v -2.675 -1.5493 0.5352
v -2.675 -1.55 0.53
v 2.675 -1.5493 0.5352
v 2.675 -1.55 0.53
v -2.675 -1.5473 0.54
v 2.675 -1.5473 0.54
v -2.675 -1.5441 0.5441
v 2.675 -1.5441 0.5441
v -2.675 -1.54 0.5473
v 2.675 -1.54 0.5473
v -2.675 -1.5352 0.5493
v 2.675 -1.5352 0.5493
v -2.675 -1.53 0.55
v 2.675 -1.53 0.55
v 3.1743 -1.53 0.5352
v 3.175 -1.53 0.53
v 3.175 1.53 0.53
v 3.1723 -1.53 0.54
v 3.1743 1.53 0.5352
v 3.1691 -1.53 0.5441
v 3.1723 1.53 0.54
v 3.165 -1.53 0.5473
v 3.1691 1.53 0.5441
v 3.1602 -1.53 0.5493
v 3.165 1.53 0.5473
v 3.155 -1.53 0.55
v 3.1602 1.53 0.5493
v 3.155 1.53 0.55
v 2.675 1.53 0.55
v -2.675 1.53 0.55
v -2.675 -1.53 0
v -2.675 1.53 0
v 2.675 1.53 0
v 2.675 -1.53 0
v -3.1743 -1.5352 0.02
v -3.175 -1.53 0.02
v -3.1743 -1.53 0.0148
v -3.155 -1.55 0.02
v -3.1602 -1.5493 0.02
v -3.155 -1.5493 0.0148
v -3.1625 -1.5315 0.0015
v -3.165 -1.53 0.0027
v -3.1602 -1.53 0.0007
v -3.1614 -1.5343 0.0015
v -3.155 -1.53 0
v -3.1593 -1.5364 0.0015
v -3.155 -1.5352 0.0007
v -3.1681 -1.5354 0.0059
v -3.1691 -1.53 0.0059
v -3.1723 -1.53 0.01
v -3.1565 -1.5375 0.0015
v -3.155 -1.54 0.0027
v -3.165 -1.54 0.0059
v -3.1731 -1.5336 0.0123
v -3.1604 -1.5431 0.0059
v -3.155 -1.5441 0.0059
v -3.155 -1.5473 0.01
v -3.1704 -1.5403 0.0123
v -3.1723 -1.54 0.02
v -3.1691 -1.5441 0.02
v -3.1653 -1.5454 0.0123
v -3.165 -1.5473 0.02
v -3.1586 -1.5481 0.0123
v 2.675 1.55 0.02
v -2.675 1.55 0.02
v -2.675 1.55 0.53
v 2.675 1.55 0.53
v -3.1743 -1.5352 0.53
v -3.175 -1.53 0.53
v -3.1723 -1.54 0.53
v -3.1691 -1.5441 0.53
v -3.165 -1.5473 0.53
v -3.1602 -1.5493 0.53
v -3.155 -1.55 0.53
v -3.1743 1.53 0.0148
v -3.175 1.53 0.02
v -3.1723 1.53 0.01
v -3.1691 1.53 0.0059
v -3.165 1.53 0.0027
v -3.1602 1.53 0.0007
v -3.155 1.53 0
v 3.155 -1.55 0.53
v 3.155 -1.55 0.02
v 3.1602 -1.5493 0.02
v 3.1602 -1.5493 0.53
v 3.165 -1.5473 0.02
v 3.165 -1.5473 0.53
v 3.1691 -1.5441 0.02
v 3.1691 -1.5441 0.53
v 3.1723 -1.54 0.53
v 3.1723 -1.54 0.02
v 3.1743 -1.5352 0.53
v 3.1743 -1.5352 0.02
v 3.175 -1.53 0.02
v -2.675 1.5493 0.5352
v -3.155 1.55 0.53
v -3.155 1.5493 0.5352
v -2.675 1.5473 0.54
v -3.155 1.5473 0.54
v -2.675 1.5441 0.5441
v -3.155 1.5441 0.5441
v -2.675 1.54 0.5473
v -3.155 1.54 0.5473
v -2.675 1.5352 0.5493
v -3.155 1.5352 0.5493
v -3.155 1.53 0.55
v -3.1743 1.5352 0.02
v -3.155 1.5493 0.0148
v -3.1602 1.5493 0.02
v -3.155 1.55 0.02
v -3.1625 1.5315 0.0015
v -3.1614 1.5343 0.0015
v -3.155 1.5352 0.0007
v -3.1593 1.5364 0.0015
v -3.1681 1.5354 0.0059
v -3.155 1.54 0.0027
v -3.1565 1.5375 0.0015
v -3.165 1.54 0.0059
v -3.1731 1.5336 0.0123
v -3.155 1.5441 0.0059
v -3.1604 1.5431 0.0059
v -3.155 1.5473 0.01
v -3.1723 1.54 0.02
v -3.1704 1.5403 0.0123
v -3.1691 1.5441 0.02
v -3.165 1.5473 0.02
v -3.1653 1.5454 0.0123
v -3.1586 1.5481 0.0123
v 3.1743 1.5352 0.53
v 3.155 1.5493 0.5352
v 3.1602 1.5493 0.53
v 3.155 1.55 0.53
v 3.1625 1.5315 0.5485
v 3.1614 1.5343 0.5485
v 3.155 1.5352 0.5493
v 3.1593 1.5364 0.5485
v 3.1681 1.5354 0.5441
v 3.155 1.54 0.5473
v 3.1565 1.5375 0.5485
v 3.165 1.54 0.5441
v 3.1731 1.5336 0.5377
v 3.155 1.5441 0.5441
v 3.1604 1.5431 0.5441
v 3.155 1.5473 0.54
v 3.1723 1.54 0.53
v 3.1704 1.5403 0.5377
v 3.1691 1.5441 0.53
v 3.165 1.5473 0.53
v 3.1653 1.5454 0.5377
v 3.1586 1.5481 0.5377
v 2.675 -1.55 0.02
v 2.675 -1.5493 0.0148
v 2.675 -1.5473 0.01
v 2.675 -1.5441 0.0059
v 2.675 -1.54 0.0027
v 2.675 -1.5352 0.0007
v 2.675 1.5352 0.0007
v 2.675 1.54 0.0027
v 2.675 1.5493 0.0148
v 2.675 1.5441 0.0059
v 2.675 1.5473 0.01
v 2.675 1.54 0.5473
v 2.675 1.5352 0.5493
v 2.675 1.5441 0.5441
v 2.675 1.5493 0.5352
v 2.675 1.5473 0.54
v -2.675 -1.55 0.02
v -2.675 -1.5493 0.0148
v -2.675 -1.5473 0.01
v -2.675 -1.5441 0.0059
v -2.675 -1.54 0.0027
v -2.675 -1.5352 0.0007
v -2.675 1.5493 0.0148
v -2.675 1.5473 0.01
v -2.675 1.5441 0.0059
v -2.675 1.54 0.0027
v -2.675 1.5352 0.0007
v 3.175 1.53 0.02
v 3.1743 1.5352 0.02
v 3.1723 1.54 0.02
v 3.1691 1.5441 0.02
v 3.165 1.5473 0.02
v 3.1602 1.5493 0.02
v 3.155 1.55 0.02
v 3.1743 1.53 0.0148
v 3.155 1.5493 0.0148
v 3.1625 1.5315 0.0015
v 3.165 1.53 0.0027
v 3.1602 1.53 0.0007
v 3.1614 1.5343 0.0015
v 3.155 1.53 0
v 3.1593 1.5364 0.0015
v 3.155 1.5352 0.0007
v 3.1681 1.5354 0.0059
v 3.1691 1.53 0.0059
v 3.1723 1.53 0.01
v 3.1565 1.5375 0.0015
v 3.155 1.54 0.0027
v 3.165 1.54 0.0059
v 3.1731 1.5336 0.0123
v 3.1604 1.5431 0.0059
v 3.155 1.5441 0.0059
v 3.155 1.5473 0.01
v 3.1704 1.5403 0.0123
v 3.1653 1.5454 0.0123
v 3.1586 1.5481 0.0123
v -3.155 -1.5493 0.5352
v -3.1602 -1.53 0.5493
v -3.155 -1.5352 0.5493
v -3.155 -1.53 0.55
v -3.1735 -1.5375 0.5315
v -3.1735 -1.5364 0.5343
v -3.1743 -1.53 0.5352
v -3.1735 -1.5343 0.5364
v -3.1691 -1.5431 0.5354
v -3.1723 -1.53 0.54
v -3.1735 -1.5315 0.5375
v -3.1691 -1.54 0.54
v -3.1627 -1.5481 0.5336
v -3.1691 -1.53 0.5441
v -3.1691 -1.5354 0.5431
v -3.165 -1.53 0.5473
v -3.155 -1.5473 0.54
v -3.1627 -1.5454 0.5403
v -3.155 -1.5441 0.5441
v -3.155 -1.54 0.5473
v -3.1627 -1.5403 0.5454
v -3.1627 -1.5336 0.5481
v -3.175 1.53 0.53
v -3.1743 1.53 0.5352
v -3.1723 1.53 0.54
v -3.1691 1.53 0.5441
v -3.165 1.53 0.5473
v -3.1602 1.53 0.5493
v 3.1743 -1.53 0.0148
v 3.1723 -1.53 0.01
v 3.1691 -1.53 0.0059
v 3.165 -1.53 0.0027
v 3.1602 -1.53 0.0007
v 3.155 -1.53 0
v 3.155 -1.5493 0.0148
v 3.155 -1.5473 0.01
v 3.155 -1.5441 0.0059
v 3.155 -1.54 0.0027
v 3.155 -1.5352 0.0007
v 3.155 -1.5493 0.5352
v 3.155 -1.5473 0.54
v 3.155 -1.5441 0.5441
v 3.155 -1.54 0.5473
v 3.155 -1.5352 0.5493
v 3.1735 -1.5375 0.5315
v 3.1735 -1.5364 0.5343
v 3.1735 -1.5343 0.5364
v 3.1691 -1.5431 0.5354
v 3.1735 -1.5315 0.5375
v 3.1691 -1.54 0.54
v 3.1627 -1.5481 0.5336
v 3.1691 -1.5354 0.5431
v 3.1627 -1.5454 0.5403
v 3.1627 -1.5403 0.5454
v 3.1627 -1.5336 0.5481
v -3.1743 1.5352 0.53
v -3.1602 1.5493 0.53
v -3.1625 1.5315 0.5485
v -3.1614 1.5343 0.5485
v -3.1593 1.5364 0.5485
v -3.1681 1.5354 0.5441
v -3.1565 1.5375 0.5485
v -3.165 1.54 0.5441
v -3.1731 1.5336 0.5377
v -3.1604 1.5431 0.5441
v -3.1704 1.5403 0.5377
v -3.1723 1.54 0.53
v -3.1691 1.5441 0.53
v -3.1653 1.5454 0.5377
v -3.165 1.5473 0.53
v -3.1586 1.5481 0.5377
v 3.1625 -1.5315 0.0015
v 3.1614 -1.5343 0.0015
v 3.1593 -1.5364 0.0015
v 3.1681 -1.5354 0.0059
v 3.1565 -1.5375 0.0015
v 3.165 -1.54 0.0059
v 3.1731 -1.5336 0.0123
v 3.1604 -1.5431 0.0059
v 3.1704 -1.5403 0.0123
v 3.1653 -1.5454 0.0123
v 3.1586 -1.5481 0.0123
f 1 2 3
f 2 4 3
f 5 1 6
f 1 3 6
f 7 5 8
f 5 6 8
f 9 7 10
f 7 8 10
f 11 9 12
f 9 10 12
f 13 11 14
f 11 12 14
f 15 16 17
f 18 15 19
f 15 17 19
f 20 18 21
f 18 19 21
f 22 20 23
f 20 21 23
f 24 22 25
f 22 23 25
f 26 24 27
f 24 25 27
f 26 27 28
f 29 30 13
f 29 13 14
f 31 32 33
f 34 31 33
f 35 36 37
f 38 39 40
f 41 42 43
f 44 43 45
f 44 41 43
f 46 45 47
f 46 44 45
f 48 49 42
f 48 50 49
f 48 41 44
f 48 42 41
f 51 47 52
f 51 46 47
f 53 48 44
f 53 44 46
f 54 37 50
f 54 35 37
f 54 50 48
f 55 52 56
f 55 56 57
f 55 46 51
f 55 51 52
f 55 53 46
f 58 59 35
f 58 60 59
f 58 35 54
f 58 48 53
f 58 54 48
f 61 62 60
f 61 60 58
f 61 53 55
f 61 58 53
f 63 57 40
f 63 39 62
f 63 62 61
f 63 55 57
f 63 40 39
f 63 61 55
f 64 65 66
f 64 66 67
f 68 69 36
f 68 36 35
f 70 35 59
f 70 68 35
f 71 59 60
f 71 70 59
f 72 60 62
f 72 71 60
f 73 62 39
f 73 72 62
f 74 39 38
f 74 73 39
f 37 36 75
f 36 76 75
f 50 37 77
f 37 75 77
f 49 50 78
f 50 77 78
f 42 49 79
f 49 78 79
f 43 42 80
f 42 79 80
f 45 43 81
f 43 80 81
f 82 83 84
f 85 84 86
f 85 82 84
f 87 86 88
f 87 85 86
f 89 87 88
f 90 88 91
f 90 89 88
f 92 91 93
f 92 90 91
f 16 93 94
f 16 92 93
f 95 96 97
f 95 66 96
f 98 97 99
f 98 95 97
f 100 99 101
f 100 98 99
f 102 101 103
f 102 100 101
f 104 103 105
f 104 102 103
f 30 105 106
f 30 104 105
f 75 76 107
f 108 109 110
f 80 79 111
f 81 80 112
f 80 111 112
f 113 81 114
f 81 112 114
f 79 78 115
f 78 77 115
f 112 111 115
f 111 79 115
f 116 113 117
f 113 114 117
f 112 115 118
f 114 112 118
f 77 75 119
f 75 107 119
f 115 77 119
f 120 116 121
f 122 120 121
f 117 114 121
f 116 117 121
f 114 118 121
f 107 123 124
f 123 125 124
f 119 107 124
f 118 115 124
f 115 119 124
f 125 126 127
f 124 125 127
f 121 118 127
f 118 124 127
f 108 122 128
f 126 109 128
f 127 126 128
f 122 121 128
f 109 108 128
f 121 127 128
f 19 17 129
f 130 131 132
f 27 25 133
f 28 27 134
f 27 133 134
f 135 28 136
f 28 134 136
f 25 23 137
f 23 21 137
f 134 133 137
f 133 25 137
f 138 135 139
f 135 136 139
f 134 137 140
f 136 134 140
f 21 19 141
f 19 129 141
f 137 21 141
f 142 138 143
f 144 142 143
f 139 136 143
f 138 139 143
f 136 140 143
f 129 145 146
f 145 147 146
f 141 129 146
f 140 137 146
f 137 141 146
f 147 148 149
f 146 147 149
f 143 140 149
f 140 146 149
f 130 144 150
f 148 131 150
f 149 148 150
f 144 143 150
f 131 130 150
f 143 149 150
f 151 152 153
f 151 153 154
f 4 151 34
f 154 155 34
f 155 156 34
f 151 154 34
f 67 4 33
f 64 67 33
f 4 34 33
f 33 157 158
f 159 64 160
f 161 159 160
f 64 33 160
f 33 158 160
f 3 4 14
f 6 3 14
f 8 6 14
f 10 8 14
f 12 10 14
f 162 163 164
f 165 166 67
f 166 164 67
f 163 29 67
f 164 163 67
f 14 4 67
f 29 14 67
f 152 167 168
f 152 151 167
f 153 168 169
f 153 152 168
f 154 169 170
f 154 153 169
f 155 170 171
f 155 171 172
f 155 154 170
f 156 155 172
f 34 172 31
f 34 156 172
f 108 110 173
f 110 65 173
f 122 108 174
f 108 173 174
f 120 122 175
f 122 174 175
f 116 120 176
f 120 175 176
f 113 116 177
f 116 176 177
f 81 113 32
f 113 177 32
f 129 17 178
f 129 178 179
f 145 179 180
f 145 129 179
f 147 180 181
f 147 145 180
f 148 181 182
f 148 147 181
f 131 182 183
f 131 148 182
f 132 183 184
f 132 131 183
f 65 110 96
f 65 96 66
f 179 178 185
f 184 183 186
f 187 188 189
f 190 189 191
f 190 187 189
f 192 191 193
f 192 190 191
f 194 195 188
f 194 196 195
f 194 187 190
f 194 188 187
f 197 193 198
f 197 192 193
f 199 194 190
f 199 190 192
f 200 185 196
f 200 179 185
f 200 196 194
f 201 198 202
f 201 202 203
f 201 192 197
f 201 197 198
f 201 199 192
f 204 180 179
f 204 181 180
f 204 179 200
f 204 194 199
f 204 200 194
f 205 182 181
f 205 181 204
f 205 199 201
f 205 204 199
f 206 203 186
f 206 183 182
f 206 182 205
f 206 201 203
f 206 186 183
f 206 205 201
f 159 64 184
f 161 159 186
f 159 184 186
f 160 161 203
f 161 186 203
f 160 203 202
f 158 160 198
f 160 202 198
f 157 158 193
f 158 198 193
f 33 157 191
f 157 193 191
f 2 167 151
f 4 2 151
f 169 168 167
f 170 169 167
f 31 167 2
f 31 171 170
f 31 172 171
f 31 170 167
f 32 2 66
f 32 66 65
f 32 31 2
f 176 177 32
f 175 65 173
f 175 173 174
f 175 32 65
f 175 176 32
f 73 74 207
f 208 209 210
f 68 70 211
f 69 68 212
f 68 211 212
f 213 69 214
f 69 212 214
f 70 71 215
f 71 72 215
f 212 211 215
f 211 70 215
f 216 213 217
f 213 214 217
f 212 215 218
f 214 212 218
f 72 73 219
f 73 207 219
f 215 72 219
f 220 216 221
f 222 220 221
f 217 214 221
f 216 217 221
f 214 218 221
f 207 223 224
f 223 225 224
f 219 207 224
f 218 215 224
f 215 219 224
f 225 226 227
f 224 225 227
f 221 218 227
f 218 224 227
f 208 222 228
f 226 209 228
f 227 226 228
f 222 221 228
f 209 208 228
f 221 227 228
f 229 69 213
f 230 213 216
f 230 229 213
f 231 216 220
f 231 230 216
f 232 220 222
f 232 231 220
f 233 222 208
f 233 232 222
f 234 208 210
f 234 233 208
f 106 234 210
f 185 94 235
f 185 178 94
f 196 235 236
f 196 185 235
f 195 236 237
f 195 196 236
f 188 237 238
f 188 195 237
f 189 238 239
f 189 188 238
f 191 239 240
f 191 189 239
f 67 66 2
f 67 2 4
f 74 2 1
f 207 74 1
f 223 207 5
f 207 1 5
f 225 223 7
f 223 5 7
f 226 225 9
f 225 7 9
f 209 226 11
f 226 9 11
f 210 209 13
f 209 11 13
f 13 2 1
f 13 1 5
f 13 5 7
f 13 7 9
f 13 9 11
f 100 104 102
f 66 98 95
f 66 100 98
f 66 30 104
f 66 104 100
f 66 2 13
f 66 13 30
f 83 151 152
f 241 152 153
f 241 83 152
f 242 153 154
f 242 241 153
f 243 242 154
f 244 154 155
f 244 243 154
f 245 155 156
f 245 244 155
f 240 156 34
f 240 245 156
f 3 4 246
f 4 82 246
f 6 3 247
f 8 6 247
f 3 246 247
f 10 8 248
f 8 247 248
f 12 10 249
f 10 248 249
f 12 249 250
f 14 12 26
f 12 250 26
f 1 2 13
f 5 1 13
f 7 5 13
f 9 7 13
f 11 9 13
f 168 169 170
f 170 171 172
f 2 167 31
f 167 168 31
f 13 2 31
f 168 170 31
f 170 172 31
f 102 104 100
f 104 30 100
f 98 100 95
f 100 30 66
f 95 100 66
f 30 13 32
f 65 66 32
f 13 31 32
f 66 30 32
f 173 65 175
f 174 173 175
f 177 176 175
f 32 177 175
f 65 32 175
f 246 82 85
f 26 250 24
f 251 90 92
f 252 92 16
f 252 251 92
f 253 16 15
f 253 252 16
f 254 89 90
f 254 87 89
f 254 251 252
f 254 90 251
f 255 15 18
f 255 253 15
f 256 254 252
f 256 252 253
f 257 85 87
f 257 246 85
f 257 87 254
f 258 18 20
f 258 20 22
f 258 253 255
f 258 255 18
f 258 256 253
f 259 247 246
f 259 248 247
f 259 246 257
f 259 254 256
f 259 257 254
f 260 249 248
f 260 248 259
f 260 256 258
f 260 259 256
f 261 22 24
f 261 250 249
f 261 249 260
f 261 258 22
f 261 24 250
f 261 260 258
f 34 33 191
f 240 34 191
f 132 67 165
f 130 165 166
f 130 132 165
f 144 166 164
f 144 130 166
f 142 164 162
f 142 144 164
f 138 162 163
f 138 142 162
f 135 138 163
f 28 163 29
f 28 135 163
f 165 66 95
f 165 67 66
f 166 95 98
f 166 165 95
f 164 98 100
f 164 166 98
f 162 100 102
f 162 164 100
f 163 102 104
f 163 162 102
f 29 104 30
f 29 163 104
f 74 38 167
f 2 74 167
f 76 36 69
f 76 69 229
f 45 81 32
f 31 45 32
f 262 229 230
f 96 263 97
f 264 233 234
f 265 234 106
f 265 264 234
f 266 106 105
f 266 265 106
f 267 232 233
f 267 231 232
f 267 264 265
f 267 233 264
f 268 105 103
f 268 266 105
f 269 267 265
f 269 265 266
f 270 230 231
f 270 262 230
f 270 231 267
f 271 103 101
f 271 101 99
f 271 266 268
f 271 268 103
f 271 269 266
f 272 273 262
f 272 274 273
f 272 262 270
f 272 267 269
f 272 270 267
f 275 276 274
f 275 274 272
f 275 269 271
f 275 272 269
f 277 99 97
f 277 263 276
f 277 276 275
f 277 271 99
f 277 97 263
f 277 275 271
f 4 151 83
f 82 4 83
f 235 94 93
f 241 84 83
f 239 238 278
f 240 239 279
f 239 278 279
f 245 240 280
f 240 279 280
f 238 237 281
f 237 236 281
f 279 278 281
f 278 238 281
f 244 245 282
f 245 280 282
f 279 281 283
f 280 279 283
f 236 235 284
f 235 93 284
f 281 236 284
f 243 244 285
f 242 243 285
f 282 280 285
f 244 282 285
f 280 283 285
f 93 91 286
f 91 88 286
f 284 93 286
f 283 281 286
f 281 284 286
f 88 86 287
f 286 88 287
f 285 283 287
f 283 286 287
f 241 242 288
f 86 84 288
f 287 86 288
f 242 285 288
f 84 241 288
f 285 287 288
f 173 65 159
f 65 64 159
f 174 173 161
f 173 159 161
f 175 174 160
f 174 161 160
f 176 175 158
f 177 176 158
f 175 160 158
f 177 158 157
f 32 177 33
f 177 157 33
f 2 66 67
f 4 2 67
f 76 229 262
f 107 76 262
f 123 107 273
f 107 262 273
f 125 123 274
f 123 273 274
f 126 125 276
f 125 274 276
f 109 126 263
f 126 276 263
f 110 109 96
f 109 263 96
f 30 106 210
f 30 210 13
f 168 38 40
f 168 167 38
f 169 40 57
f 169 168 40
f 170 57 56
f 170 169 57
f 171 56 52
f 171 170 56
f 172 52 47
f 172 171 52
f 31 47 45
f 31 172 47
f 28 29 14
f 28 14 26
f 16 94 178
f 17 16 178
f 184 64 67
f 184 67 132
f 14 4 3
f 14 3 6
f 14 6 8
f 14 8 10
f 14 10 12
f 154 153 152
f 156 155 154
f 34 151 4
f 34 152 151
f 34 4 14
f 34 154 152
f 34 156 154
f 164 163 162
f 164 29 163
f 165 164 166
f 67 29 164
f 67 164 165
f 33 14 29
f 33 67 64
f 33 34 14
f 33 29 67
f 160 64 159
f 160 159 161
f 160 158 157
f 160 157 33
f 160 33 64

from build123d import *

# Parameters (mm, degrees)
F2_W     = 5.35
F2_H     = 3.1
F3_DEPTH = 0.53
F2_W_2   = 0.5
F4_DEPTH = 0.55
F5_DEPTH = 0.55
F6_DEPTH = 0.02
F7_R     = 0.01999
F7_2_R   = 0.01999
F7_3_R   = 0.01999
F7_4_R   = 0.01999


# Not quite as in the source:
# - a fillet or chamfer is up to 0.001 mm smaller than in the source, because OpenCascade refuses the exact size


with BuildPart() as f3:
    # F2 (on Top) → F3 (new body)
    with BuildSketch(Plane.XY):
        Rectangle(F2_W, F2_H)
    extrude(amount=F3_DEPTH)


with BuildPart() as f4:
    # F2 (on Top) → F4 (new body)
    with BuildSketch(Plane.XY):
        with Locations((-2.925, 0)):
            Rectangle(F2_W_2, F2_H)
    extrude(amount=F4_DEPTH)

    # F7 (radius 0.02 in the source; OpenCascade refuses exactly that, so slightly less here)
    f7_edges = [f4.edges().sort_by_distance(p)[0] for p in [
        (-2.925, -1.55, 0.55),
        (-3.175, 1.55, 0.275),
        (-3.175, -1.55, 0.275),
        (-3.175, 0, 0),
        (-3.175, 0, 0.55),
        (-2.925, 1.55, 0.55),
        (-2.925, 1.55, 0),
        (-2.925, -1.55, 0),
    ]]
    fillet(f7_edges, radius=F7_R)


with BuildPart() as f5:
    # F2 (on Top) → F5 (new body)
    with BuildSketch(Plane.XY):
        with Locations((2.925, 0)):
            Rectangle(F2_W_2, F2_H)
    extrude(amount=F5_DEPTH)

    # F7#2 (radius 0.02 in the source; OpenCascade refuses exactly that, so slightly less here)
    f7_2_edges = [f5.edges().sort_by_distance(p)[0] for p in [
        (2.925, -1.55, 0.55),
        (3.175, -1.55, 0.275),
        (3.175, 1.55, 0.275),
        (3.175, 0, 0),
        (3.175, 0, 0.55),
        (2.925, 1.55, 0.55),
        (2.925, 1.55, 0),
        (2.925, -1.55, 0),
    ]]
    fillet(f7_2_edges, radius=F7_2_R)


with BuildPart() as f6:
    # F6 (new): a face of the model
    f6_faces = [f3.part.faces().sort_by_distance(p)[0] for p in [
        (0, 0, 0.53),
    ]]
    extrude(f6_faces, amount=F6_DEPTH)

    # F7#4 (radius 0.02 in the source; OpenCascade refuses exactly that, so slightly less here)
    f7_4_edges = [f6.edges().sort_by_distance(p)[0] for p in [
        (0, -1.55, 0.55),
        (0, 1.55, 0.55),
    ]]
    fillet(f7_4_edges, radius=F7_4_R)


with BuildPart() as f3_1:
    add(f3.part)

    # F7#3 (radius 0.02 in the source; OpenCascade refuses exactly that, so slightly less here)
    f7_3_edges = [f3_1.edges().sort_by_distance(p)[0] for p in [
        (0, 1.55, 0),
        (0, -1.55, 0),
    ]]
    fillet(f7_3_edges, radius=F7_3_R)


solid = Compound([f4.part, f5.part, f6.part, f3_1.part])
